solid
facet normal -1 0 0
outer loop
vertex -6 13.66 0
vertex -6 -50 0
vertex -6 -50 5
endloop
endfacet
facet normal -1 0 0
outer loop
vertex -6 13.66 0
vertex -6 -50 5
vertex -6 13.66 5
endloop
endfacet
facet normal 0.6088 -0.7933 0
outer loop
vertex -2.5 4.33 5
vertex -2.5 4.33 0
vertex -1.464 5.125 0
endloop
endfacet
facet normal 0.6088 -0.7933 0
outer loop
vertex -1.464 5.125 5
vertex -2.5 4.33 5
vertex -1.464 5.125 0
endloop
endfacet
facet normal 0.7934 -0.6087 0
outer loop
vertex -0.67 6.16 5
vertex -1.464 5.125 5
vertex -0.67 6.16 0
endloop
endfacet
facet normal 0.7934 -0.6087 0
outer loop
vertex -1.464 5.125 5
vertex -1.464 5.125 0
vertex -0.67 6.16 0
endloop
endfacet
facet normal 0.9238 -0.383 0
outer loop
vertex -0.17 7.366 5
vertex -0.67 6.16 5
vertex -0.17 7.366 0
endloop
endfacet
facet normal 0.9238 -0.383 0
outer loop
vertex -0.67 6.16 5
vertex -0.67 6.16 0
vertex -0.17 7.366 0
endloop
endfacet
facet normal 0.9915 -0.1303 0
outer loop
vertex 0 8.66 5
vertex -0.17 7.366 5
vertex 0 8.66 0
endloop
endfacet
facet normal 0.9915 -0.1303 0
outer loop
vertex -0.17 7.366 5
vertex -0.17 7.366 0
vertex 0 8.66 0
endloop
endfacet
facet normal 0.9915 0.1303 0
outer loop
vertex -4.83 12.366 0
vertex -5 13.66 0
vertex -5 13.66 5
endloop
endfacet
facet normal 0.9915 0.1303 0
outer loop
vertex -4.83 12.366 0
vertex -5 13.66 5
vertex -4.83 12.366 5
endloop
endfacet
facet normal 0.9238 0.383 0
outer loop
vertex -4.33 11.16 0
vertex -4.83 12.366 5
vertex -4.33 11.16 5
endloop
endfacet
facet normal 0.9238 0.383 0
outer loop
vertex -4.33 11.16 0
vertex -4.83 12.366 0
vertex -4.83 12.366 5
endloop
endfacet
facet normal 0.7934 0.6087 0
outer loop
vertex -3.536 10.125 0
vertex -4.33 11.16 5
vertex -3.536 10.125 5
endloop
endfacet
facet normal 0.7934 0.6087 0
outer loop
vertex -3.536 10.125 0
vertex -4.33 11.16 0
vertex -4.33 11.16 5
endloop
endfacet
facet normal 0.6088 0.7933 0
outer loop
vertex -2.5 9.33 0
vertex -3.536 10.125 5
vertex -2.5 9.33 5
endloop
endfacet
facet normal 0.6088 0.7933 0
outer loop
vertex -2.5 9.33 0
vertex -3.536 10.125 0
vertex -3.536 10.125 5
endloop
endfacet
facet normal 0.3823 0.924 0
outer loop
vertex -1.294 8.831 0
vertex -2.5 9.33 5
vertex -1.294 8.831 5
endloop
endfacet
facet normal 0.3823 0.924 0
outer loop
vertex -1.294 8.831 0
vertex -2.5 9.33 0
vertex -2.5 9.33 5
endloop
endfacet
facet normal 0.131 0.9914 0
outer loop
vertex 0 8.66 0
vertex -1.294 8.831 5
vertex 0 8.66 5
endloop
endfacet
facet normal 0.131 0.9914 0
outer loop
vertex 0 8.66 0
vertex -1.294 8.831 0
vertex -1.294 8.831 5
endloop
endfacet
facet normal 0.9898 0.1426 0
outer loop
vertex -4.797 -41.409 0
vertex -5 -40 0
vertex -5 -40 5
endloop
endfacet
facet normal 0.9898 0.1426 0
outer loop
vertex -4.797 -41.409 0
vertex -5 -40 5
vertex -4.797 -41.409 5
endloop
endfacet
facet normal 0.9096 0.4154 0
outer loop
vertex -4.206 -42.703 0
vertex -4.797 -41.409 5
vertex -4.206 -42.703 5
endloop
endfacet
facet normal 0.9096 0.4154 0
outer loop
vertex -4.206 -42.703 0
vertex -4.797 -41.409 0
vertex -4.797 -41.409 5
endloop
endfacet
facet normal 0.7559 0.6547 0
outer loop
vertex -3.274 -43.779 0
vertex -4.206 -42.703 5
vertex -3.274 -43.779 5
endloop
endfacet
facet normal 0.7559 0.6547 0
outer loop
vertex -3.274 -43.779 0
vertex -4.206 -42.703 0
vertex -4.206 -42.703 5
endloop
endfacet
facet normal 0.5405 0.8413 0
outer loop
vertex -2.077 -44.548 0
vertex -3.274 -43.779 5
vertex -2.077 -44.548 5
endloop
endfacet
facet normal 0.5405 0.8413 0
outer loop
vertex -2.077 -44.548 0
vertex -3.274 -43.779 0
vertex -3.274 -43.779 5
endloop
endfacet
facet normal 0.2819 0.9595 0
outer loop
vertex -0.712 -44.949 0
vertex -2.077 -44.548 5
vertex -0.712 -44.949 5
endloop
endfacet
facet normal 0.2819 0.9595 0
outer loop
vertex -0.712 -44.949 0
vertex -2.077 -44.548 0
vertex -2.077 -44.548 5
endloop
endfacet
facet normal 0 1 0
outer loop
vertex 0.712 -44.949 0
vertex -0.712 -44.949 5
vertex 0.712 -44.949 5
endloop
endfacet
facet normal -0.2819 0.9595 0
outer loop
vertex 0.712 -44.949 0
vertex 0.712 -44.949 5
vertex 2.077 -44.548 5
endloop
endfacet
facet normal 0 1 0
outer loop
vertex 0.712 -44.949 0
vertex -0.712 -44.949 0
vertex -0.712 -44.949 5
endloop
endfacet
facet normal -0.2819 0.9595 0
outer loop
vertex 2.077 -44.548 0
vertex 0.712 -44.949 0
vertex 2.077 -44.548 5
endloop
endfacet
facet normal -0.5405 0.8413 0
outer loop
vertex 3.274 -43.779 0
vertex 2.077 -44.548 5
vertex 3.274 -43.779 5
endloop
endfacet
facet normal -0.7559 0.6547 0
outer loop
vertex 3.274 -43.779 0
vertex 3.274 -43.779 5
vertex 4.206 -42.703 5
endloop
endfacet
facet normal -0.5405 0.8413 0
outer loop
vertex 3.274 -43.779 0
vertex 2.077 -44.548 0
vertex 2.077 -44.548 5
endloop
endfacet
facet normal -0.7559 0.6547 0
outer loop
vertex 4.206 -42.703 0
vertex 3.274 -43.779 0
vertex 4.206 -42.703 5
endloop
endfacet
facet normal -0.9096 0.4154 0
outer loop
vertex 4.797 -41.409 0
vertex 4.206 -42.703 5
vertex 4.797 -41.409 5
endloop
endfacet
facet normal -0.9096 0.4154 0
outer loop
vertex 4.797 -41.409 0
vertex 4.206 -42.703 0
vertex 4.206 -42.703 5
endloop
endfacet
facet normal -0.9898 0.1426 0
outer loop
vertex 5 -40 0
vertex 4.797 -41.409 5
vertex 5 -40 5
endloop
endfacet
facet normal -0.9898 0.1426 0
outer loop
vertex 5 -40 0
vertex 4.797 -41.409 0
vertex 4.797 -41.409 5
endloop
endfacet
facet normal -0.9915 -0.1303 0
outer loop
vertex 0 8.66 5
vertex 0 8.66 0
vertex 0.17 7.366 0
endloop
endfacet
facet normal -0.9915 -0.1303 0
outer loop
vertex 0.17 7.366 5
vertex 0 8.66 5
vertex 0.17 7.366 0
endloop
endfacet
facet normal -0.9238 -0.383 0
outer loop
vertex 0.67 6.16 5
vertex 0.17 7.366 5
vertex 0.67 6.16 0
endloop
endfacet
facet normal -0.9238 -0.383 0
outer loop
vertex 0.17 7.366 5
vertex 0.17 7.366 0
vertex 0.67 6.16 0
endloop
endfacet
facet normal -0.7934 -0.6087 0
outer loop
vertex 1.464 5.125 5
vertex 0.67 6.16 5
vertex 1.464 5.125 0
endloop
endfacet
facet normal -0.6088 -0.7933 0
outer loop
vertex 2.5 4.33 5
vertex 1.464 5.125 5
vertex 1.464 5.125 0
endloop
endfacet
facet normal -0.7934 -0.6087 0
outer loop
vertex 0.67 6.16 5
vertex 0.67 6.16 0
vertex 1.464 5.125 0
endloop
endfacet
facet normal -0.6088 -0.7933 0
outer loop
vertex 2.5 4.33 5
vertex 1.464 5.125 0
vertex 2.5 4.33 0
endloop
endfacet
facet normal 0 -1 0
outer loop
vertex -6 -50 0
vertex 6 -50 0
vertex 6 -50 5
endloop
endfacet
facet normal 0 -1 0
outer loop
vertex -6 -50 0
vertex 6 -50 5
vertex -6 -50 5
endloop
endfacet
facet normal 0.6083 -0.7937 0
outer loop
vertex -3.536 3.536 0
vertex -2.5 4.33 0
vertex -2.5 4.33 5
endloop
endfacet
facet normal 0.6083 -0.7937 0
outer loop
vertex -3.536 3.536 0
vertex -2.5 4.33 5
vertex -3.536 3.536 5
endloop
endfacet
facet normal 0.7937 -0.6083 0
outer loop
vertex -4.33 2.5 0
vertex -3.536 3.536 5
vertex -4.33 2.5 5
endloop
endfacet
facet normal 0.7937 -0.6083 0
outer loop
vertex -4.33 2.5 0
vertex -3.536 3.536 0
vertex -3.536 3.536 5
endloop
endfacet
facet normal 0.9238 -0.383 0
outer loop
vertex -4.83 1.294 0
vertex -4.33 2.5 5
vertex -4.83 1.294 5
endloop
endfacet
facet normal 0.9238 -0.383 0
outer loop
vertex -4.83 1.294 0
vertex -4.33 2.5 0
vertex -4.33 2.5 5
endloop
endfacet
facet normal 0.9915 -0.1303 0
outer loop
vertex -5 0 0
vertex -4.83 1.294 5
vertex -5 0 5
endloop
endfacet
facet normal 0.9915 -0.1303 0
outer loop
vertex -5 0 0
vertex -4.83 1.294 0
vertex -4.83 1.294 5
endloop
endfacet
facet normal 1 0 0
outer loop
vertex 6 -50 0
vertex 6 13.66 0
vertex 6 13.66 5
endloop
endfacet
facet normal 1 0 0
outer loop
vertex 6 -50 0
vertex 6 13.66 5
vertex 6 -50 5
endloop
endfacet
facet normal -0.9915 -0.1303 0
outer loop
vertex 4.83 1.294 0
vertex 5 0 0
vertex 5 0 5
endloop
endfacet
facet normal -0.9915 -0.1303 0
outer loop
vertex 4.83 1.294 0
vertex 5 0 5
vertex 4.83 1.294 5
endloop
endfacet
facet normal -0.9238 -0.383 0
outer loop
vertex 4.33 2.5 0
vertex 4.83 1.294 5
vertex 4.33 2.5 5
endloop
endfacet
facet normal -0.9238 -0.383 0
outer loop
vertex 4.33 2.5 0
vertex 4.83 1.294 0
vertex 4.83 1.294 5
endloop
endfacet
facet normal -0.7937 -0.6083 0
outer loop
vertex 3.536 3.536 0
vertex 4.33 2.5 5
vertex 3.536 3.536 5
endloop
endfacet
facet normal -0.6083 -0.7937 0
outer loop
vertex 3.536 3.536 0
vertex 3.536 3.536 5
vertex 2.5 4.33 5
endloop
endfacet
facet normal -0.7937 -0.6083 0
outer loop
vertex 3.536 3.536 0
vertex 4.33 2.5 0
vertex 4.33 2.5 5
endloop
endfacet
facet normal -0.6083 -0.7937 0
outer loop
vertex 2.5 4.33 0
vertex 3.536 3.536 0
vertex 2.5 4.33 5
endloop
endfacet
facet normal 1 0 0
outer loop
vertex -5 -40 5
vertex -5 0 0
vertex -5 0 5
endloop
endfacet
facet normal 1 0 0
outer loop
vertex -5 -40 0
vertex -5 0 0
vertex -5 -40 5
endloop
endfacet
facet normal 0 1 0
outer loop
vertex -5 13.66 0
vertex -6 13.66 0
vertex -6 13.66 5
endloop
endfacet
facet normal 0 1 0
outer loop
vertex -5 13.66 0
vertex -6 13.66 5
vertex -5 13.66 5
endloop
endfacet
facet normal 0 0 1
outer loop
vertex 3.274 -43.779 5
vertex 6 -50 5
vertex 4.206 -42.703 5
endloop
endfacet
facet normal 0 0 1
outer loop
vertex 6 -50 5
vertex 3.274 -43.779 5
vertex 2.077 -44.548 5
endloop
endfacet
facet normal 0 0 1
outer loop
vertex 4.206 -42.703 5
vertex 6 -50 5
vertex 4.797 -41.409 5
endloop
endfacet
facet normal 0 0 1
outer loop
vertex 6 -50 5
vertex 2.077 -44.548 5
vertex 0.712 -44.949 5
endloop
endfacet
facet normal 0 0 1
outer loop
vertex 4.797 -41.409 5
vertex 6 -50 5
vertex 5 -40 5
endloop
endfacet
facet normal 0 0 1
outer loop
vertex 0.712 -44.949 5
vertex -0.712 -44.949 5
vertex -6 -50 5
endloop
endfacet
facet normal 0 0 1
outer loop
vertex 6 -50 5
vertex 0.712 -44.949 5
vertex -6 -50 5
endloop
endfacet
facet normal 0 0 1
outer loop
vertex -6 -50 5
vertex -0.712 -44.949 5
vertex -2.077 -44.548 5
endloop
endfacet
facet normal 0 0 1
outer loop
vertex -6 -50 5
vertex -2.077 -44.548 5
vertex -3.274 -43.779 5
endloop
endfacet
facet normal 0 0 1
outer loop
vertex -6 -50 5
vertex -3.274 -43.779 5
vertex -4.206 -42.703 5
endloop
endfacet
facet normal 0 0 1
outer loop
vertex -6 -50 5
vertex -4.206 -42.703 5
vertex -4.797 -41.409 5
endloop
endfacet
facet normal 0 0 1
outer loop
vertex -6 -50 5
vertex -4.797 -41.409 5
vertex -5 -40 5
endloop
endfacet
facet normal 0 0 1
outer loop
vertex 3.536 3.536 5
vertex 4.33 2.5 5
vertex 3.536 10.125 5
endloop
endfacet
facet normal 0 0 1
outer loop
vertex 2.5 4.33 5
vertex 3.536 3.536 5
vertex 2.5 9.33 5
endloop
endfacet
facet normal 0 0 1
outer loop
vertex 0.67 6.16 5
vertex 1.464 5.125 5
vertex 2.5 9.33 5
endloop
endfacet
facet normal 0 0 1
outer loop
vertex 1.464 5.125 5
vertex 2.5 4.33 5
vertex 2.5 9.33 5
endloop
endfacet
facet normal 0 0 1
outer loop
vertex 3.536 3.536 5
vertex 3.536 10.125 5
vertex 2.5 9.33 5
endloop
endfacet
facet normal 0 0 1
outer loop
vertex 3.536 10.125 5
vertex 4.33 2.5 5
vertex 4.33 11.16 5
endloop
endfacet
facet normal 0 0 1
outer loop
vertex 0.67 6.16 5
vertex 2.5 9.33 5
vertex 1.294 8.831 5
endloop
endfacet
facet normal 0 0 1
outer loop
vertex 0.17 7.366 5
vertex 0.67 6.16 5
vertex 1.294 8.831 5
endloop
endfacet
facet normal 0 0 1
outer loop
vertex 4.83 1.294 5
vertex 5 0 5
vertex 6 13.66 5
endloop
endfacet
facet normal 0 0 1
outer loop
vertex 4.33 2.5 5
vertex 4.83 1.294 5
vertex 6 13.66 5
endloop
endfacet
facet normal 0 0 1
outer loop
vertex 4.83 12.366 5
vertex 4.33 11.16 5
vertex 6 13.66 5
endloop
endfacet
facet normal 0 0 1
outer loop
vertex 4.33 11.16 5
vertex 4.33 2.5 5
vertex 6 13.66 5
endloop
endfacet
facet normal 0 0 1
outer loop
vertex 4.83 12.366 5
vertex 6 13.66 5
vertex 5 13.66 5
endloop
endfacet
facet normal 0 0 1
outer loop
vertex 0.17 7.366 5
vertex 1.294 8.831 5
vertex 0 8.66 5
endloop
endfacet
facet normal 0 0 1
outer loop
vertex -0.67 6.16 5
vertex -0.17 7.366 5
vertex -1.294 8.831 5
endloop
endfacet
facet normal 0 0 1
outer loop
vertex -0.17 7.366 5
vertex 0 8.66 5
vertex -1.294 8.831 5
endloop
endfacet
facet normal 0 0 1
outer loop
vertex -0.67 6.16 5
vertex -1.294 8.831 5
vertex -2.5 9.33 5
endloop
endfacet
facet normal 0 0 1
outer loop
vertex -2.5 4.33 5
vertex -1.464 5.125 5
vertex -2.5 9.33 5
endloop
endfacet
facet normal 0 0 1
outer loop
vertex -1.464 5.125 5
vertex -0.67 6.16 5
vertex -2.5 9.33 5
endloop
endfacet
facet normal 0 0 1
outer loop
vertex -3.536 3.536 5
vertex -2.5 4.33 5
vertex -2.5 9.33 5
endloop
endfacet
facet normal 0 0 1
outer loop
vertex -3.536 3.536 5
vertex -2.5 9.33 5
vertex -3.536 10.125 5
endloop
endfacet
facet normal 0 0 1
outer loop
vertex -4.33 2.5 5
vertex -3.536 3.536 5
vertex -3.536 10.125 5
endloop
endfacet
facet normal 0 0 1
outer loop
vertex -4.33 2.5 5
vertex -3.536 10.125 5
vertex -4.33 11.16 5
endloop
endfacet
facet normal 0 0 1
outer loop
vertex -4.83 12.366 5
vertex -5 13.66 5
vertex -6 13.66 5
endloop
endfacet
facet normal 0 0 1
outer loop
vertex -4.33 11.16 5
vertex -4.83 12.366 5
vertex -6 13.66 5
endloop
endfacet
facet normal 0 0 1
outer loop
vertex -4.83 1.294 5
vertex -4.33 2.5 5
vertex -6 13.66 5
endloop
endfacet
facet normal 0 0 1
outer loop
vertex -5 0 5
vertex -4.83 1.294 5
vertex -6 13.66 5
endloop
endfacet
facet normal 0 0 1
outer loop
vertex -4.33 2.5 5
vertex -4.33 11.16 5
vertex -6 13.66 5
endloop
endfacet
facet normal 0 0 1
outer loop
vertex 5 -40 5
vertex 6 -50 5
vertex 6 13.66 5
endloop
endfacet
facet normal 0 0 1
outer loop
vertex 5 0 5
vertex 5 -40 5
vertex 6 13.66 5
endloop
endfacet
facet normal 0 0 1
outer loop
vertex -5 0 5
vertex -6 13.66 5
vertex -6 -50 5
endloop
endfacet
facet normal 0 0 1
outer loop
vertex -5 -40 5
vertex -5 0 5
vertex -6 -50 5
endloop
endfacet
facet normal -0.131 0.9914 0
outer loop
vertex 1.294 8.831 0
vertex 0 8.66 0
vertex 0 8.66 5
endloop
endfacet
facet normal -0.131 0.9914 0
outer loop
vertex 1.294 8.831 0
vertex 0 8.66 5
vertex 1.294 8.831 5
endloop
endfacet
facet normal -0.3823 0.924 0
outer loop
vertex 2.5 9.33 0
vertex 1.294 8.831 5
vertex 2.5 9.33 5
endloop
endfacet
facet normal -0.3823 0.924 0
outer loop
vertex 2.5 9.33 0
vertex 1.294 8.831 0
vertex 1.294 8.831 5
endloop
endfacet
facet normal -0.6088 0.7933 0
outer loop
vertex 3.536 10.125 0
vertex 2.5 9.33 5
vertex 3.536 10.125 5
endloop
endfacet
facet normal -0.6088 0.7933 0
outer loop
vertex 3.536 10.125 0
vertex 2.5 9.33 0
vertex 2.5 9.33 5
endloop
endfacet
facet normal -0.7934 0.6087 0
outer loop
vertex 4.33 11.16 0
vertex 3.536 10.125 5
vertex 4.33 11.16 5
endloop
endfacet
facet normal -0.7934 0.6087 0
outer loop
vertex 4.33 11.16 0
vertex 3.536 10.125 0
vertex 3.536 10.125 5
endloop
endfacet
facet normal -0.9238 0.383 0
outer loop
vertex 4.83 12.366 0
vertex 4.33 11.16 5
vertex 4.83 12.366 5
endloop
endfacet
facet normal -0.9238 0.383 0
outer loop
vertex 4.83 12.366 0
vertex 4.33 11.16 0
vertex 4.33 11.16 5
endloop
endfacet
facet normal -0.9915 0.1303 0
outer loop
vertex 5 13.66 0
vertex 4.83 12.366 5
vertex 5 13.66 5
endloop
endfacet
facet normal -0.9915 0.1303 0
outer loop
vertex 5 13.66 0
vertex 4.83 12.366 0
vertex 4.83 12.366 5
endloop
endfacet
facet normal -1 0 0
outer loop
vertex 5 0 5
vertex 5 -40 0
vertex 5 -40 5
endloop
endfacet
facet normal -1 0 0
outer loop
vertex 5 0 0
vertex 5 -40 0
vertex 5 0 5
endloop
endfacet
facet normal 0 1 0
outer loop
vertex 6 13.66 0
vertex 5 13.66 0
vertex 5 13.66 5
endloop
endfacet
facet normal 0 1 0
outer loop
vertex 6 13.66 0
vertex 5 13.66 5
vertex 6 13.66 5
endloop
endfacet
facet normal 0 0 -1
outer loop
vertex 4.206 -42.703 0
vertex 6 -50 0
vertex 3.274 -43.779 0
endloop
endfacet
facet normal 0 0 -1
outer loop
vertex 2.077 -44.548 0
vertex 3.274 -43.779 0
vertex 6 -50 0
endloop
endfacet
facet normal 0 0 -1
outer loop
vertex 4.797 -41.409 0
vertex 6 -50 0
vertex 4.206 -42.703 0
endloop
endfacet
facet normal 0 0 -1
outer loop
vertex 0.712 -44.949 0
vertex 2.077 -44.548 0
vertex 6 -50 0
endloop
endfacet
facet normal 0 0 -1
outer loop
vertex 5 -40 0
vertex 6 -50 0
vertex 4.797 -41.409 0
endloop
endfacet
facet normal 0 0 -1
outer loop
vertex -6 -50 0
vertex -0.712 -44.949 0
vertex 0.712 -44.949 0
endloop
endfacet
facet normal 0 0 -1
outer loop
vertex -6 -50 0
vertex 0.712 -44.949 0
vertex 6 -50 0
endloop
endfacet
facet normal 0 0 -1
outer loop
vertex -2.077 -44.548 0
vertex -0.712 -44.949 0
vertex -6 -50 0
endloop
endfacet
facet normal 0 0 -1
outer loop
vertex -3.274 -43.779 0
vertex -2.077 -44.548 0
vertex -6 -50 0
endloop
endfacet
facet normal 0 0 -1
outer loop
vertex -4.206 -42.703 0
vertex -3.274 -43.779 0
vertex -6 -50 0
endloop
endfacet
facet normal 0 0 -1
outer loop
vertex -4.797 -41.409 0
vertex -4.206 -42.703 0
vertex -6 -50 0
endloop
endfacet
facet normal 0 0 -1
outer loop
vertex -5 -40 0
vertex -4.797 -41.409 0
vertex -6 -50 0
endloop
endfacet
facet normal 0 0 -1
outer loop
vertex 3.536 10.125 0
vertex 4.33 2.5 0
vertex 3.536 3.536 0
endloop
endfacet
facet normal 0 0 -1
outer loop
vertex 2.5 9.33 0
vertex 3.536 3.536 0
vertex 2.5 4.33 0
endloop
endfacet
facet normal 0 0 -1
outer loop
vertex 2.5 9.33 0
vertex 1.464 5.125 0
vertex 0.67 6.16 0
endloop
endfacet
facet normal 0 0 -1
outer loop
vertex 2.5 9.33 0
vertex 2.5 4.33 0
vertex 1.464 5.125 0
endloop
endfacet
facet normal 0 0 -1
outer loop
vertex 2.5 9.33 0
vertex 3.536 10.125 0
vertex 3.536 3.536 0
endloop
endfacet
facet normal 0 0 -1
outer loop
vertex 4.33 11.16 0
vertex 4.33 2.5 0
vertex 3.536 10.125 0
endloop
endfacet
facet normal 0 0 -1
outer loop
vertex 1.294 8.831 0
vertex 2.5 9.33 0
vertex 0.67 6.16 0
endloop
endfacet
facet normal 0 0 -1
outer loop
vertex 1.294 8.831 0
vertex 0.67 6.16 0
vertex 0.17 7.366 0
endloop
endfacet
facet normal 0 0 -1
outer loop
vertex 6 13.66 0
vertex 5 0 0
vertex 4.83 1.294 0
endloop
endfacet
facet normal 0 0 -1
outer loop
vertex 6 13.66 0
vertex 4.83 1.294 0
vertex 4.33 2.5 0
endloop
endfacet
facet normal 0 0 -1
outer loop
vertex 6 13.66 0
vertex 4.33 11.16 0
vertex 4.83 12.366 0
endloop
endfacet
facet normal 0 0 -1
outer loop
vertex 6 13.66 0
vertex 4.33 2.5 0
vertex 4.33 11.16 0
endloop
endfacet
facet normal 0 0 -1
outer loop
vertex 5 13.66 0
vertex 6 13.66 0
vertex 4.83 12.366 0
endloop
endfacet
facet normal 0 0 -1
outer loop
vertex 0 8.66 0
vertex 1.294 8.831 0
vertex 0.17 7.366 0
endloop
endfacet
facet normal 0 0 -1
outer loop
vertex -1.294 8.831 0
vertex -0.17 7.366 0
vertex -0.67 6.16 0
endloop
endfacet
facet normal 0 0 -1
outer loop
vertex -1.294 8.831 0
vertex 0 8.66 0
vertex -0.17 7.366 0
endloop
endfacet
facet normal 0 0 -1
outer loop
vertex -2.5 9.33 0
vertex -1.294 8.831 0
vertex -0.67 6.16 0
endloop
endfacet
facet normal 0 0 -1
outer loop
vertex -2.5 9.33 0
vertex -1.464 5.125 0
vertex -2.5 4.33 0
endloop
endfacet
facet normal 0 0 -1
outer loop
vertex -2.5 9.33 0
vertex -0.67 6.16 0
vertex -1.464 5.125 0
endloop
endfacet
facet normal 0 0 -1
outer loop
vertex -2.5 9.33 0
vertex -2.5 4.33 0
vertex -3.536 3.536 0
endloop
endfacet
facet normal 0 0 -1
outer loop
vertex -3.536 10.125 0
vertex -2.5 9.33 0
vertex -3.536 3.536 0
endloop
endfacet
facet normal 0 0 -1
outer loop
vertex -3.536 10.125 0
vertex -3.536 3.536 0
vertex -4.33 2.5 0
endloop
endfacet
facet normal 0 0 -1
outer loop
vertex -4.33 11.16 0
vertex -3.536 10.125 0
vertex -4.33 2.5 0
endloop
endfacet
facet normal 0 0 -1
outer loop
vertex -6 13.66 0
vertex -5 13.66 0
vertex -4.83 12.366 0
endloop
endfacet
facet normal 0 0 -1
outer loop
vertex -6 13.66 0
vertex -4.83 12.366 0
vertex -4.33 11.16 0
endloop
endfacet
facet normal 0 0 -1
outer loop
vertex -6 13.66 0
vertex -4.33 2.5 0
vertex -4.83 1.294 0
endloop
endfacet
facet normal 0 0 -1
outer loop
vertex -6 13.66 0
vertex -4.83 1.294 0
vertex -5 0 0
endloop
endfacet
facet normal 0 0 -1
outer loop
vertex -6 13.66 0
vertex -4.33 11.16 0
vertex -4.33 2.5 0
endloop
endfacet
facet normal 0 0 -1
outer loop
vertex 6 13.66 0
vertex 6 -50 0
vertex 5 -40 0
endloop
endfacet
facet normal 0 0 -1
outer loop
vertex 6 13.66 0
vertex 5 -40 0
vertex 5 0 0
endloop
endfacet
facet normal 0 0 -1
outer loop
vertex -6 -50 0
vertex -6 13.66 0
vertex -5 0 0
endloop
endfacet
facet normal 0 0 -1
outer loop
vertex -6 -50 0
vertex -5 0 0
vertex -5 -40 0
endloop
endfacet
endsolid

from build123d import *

# Parameters (mm, degrees)
PAD_DEPTH = 5


with BuildPart() as part:
    # Sketch → Pad (new body)
    with BuildSketch(Plane.XY):
        with BuildLine():
            ThreePointArc((-5, 13.660254), (-3.535534, 10.12472), (0, 8.660254))
            ThreePointArc((-2.5, 4.330127), (-0.669873, 6.160254), (0, 8.660254))
            ThreePointArc((-2.5, 4.330127), (-4.330127, 2.5), (-5, 0))
            Line((-5, 0), (-5, -40))
            ThreePointArc((-5, -40), (0, -45), (5, -40))
            Line((5, -40), (5, 0))
            ThreePointArc((5, 0), (4.330127, 2.5), (2.5, 4.330127))
            ThreePointArc((0, 8.660254), (0.669873, 6.160254), (2.5, 4.330127))
            ThreePointArc((0, 8.660254), (3.535534, 10.12472), (5, 13.660254))
            Line((5, 13.660254), (6, 13.660254))
            Line((6, 13.660254), (6, -50))
            Line((6, -50), (-6, -50))
            Line((-6, -50), (-6, 13.660254))
            Line((-6, 13.660254), (-5, 13.660254))
        make_face()
    extrude(amount=PAD_DEPTH)


solid = part.part
